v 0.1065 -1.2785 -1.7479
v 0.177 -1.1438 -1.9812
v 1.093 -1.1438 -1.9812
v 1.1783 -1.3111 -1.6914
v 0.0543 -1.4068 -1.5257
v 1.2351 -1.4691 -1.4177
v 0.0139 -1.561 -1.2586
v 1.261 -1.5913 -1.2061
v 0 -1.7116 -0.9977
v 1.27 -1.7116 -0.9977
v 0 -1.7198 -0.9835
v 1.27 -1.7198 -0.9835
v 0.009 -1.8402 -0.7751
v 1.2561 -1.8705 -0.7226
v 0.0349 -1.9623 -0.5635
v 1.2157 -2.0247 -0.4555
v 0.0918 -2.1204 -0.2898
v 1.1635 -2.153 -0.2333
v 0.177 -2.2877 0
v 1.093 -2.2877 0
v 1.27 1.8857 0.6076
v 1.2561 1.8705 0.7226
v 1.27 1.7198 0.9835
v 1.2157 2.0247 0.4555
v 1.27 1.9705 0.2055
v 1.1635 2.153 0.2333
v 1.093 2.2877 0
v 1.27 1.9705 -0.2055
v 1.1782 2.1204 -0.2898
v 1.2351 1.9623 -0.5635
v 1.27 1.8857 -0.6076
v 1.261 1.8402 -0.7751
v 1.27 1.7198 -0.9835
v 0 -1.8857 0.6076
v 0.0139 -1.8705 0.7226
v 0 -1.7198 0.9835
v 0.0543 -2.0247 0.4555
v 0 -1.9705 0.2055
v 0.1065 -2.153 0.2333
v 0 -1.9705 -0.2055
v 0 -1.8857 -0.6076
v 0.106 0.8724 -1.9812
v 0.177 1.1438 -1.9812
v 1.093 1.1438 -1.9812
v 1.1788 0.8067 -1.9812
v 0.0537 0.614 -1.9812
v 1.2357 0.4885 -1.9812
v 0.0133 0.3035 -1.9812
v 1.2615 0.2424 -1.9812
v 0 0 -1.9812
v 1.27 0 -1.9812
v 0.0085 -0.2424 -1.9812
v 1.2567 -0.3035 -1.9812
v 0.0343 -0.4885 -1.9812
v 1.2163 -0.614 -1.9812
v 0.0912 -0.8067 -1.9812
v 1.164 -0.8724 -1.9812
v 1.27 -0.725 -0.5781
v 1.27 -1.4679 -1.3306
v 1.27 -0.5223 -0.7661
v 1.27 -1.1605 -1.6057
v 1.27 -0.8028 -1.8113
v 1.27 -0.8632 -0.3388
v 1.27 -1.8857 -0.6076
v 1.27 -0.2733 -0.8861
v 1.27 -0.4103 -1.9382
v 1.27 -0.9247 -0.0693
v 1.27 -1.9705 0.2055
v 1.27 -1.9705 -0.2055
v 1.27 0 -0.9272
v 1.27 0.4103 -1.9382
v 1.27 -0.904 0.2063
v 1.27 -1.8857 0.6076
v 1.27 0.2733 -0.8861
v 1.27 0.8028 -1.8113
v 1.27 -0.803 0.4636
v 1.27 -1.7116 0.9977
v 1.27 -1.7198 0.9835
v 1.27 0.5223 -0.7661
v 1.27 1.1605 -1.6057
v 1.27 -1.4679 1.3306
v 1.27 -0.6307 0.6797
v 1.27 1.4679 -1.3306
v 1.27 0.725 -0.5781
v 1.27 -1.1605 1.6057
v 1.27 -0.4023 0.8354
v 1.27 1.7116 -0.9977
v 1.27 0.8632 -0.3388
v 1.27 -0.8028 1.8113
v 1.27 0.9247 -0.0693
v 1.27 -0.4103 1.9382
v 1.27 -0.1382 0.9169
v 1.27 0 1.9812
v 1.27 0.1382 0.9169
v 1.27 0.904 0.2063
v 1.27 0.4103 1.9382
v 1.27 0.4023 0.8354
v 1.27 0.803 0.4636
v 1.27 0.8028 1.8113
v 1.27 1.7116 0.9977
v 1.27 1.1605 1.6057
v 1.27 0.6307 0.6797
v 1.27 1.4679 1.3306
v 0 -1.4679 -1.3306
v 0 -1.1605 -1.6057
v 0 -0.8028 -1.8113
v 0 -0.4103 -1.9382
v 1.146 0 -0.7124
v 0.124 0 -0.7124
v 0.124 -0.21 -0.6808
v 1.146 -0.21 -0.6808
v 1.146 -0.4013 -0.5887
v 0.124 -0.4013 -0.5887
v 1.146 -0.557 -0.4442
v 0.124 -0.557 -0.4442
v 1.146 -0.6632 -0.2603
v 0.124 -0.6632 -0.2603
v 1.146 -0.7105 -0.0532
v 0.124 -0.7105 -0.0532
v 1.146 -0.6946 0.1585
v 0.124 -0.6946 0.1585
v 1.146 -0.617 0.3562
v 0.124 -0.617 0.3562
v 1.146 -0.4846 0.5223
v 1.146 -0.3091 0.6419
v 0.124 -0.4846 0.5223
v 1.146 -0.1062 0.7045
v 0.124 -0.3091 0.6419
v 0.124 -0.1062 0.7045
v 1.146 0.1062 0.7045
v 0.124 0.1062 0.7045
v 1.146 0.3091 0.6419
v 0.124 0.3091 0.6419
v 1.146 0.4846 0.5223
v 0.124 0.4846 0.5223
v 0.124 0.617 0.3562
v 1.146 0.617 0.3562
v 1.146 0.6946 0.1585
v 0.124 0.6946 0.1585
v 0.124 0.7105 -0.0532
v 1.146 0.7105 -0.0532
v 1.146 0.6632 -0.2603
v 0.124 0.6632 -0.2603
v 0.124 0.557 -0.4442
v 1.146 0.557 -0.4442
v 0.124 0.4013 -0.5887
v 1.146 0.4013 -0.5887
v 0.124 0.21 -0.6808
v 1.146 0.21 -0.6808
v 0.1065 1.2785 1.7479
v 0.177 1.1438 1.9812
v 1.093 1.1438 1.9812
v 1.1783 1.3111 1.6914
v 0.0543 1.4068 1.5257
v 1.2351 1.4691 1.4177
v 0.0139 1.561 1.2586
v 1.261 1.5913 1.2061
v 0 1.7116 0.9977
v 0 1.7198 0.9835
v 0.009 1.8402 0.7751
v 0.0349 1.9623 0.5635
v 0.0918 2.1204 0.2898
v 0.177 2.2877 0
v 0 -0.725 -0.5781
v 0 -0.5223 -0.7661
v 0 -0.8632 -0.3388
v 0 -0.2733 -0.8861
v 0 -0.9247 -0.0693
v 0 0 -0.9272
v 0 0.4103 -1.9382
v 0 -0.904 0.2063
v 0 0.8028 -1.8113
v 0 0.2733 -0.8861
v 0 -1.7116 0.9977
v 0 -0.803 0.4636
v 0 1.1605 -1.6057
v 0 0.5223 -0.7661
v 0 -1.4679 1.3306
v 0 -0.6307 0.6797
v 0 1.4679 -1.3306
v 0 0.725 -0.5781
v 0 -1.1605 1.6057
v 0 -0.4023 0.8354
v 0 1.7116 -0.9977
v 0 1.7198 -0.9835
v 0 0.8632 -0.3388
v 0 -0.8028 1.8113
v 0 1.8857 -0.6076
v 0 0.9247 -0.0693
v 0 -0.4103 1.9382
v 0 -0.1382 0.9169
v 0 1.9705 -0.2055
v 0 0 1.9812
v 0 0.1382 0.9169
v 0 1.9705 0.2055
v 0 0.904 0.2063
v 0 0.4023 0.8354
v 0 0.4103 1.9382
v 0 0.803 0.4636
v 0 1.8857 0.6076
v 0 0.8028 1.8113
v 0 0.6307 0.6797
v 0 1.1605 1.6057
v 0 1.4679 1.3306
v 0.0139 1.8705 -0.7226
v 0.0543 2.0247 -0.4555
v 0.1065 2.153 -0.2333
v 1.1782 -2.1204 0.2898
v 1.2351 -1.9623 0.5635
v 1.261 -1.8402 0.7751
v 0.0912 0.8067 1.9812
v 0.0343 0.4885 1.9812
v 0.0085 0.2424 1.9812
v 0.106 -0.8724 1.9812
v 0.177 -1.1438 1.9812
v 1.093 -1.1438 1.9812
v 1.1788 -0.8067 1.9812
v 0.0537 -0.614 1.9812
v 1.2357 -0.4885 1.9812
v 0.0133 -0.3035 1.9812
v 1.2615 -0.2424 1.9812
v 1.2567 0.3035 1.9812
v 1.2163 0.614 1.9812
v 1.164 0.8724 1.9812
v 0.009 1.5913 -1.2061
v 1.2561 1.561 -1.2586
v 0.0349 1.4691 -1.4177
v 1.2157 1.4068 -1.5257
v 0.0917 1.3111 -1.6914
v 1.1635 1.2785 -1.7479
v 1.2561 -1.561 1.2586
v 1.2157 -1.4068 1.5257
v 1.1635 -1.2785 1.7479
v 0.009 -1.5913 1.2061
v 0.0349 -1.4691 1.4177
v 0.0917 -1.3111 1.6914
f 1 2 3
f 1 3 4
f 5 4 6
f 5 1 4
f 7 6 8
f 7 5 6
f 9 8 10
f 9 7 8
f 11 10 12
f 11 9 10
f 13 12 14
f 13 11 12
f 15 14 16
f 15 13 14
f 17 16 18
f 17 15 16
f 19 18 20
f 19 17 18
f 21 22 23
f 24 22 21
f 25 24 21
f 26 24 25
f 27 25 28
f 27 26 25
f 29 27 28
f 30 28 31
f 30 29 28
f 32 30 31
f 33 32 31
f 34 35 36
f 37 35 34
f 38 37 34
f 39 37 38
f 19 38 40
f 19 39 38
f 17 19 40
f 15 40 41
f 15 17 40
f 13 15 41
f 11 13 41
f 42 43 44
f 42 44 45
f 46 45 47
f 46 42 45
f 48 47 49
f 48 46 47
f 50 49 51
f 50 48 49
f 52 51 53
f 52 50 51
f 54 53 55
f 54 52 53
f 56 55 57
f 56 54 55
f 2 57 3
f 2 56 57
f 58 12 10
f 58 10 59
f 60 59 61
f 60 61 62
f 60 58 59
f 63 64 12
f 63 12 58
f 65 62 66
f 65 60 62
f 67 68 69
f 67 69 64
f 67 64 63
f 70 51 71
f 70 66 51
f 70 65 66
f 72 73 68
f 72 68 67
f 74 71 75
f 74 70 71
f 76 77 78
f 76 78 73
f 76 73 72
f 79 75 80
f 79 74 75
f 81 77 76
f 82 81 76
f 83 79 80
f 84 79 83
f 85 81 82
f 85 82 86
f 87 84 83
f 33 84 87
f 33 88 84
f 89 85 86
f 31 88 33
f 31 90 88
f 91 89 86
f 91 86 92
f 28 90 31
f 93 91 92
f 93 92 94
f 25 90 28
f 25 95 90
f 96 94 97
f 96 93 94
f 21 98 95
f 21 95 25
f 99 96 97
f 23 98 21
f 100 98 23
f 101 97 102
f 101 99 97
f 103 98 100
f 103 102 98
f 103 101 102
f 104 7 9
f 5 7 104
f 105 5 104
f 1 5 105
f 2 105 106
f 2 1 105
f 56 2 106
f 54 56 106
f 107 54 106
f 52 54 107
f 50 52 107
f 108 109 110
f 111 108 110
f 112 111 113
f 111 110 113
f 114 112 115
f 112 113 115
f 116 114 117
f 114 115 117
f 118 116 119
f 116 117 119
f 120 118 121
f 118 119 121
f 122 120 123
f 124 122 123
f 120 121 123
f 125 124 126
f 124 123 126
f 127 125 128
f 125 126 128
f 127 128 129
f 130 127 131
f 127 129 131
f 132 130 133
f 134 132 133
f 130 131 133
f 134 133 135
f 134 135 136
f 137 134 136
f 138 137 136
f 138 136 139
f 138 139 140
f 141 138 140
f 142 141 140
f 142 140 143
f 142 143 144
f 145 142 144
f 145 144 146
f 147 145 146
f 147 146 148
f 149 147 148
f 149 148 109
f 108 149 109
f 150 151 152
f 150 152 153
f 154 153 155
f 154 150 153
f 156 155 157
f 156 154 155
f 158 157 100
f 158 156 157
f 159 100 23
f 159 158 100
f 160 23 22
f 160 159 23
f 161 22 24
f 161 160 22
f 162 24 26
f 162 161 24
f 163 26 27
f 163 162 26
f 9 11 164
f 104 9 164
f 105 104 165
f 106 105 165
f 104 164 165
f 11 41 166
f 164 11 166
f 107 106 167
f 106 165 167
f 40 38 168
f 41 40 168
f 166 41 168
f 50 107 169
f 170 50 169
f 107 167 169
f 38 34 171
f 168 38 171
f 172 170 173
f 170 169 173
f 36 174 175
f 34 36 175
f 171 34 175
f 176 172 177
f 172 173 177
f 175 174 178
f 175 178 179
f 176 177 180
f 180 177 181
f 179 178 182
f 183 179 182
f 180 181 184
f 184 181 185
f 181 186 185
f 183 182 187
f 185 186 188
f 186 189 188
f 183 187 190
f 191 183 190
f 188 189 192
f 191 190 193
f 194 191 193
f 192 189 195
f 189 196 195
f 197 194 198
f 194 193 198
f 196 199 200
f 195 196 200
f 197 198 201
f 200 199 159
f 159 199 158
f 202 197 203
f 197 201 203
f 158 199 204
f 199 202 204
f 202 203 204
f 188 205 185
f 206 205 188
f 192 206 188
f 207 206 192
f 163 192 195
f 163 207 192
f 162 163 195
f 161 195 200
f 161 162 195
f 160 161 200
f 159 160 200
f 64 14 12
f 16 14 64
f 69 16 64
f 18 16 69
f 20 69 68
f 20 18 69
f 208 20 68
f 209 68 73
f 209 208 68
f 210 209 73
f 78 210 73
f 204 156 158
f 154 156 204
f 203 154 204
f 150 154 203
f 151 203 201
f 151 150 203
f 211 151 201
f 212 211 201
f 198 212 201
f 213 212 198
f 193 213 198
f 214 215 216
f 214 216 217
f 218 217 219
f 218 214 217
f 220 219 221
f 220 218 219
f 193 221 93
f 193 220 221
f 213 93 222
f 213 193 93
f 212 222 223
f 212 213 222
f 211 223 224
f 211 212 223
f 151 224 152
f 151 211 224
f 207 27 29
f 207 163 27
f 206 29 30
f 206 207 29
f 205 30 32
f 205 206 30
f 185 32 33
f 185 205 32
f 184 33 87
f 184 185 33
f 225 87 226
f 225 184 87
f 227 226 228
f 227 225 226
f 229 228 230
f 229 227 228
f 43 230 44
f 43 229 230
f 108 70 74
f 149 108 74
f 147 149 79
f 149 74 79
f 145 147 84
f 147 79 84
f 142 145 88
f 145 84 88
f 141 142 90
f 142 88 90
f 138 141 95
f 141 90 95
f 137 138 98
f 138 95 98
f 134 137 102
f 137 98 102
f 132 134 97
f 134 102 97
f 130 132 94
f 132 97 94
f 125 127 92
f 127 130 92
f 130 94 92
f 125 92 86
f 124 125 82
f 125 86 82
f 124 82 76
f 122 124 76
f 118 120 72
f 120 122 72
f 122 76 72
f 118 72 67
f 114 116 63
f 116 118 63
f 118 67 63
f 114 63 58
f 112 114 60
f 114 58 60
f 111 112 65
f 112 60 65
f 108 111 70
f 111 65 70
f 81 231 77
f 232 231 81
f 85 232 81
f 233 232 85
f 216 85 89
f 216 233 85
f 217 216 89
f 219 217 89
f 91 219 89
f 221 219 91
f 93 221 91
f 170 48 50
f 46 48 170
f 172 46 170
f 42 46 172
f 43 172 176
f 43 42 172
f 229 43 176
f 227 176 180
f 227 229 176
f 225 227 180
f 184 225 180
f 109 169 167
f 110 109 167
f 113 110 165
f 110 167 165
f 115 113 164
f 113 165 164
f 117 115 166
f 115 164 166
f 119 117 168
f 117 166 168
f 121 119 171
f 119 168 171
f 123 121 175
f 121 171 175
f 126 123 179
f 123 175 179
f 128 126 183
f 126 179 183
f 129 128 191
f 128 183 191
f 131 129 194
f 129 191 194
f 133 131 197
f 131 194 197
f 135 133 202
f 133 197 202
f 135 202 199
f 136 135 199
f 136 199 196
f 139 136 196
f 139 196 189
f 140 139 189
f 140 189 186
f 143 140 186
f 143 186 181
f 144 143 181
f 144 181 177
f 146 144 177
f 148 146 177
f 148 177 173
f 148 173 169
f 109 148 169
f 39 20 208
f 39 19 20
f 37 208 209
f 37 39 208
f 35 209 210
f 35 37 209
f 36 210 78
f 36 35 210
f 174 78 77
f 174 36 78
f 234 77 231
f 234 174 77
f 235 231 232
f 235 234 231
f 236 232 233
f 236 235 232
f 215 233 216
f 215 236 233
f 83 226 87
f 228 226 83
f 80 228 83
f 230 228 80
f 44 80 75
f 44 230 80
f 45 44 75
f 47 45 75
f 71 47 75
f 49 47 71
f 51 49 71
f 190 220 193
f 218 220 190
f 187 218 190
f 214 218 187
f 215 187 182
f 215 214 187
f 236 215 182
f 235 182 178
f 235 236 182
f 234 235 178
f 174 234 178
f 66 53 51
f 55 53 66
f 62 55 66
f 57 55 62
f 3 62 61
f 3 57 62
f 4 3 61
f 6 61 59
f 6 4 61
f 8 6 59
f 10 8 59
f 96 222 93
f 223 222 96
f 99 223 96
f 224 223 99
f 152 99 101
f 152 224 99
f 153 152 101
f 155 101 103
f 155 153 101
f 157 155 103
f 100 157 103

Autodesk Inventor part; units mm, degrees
ref_plane "YZ Plane" through (0, 0, 0) normal (1, 0, 0) x (0, 1, 0)
ref_plane "XZ Plane" through (0, 0, 0) normal (0, 1, 0) x (-1, 0, 0)
sketch "Sketch1" plane through (0, 0, 0) normal (1, 0, 0) x (0, 1, 0)
  line L0 (-2.2877, 0) -> (-1.1438, 1.9812)
  line L1 (-1.1438, 1.9812) -> (1.1438, 1.9812)
  line L2 (1.1438, 1.9812) -> (2.2877, 0)
  line L3 (2.2877, 0) -> (1.1438, -1.9812)
  line L4 (1.1438, -1.9812) -> (-1.1438, -1.9812)
  line L5 (-1.1438, -1.9812) -> (-2.2877, 0)
  point P0 (0, 0)
  point P1 (0, 0)
  dimension "d0" = 4.5754
extrude "Body" add sketch "Sketch1" along normal blind 1.27
sketch "Sketch2" plane through (0, 0, 0) normal (0, 0, 1) x (1, 0, 0)
  line L0 (0, 1.1438) -> (0, 2.2877) projected
  line L1 (0, 2.2877) -> (1.27, 2.2877) projected
  line L2 (1.27, 1.1438) -> (1.27, 2.2877) projected
  line L3 (-0.254, 0) -> (1.524, 0) projected
  line L4 (0.177, 2.2877) -> (0, 1.9812)
  line L5 (1.093, 2.2877) -> (1.27, 1.9812)
  dimension "d3" = 30
  dimension "d4" = 30
  dimension "d5" = 3.9624
  dimension "d6" = 3.9624
revolve "Chamfer1" cut sketch "Sketch2" angle 360 about axis through (-10, 0, 0) along (1, 0, 0)
sketch "Sketch3" plane through (1.27, 0, 0) normal (1, 0, 0) x (0, 0, -1)
  arc A0 (-0.9906, -1.7158) -> (0.9906, -1.7158) centre (0, 0) ccw projected
hole "Thread" at (1.27, 0, 0) direction (-1, 0, 0) diameter 1.4249 end through all thread size "1-64 UNC" class "2B" standard "ANSI Unified Screw Threads"
chamfer "Chamfer2" distance 0.2148 angle 30 1 edges at (1.27, 0, 0.7125) measured on face at (1.27, 1.5493, -0.0286)
chamfer "Chamfer3" distance 0.2148 angle 30 1 edges at (0, 0, 0.7125) measured on face at (0, 1.5493, 0.0286)
ref_plane "Work Plane1" through (-4.9145, 0, 0) normal (0, -0.866, -0.5) x (1, 0, 0)
equation "\"d0\" = 1.1547 * SW"
equation "\"d1\" = KOH"
equation "\"d3\" = ANG1"
equation "\"d4\" = ANG2"
equation "\"d5\" = SW0"
equation "\"d6\" = SW01"
equation "\"d8\" = -0.5 * GD1 + 0.5 * NND"
equation "\"d40\" = -0.5 * GD1 + 0.5 * NND"
equation "\"d10\" = -0.5 * GD1 + 0.5 * NND"
equation "\"d41\" = -0.5 * GD1 + 0.5 * NND"
equation "\"ANG1\" = 30deg"
equation "\"ANG2\" = 30deg"
equation "\"NND\" = 1.8542"
equation "\"KOH\" = 1.27"
equation "\"SW\" = 3.9624"
equation "\"SW0\" = SW"
equation "\"SW01\" = SW"
equation "\"THREADDIA\" = 1.8542"
equation "\"TOA\" = 30deg"
equation "\"E0\" = 1.155 * SW"
equation "\"GD1\" = 1.42457"
properties part number "ANSI B18.2.2 - 1 - 64, HMSNI" material "Steel, Mild"
